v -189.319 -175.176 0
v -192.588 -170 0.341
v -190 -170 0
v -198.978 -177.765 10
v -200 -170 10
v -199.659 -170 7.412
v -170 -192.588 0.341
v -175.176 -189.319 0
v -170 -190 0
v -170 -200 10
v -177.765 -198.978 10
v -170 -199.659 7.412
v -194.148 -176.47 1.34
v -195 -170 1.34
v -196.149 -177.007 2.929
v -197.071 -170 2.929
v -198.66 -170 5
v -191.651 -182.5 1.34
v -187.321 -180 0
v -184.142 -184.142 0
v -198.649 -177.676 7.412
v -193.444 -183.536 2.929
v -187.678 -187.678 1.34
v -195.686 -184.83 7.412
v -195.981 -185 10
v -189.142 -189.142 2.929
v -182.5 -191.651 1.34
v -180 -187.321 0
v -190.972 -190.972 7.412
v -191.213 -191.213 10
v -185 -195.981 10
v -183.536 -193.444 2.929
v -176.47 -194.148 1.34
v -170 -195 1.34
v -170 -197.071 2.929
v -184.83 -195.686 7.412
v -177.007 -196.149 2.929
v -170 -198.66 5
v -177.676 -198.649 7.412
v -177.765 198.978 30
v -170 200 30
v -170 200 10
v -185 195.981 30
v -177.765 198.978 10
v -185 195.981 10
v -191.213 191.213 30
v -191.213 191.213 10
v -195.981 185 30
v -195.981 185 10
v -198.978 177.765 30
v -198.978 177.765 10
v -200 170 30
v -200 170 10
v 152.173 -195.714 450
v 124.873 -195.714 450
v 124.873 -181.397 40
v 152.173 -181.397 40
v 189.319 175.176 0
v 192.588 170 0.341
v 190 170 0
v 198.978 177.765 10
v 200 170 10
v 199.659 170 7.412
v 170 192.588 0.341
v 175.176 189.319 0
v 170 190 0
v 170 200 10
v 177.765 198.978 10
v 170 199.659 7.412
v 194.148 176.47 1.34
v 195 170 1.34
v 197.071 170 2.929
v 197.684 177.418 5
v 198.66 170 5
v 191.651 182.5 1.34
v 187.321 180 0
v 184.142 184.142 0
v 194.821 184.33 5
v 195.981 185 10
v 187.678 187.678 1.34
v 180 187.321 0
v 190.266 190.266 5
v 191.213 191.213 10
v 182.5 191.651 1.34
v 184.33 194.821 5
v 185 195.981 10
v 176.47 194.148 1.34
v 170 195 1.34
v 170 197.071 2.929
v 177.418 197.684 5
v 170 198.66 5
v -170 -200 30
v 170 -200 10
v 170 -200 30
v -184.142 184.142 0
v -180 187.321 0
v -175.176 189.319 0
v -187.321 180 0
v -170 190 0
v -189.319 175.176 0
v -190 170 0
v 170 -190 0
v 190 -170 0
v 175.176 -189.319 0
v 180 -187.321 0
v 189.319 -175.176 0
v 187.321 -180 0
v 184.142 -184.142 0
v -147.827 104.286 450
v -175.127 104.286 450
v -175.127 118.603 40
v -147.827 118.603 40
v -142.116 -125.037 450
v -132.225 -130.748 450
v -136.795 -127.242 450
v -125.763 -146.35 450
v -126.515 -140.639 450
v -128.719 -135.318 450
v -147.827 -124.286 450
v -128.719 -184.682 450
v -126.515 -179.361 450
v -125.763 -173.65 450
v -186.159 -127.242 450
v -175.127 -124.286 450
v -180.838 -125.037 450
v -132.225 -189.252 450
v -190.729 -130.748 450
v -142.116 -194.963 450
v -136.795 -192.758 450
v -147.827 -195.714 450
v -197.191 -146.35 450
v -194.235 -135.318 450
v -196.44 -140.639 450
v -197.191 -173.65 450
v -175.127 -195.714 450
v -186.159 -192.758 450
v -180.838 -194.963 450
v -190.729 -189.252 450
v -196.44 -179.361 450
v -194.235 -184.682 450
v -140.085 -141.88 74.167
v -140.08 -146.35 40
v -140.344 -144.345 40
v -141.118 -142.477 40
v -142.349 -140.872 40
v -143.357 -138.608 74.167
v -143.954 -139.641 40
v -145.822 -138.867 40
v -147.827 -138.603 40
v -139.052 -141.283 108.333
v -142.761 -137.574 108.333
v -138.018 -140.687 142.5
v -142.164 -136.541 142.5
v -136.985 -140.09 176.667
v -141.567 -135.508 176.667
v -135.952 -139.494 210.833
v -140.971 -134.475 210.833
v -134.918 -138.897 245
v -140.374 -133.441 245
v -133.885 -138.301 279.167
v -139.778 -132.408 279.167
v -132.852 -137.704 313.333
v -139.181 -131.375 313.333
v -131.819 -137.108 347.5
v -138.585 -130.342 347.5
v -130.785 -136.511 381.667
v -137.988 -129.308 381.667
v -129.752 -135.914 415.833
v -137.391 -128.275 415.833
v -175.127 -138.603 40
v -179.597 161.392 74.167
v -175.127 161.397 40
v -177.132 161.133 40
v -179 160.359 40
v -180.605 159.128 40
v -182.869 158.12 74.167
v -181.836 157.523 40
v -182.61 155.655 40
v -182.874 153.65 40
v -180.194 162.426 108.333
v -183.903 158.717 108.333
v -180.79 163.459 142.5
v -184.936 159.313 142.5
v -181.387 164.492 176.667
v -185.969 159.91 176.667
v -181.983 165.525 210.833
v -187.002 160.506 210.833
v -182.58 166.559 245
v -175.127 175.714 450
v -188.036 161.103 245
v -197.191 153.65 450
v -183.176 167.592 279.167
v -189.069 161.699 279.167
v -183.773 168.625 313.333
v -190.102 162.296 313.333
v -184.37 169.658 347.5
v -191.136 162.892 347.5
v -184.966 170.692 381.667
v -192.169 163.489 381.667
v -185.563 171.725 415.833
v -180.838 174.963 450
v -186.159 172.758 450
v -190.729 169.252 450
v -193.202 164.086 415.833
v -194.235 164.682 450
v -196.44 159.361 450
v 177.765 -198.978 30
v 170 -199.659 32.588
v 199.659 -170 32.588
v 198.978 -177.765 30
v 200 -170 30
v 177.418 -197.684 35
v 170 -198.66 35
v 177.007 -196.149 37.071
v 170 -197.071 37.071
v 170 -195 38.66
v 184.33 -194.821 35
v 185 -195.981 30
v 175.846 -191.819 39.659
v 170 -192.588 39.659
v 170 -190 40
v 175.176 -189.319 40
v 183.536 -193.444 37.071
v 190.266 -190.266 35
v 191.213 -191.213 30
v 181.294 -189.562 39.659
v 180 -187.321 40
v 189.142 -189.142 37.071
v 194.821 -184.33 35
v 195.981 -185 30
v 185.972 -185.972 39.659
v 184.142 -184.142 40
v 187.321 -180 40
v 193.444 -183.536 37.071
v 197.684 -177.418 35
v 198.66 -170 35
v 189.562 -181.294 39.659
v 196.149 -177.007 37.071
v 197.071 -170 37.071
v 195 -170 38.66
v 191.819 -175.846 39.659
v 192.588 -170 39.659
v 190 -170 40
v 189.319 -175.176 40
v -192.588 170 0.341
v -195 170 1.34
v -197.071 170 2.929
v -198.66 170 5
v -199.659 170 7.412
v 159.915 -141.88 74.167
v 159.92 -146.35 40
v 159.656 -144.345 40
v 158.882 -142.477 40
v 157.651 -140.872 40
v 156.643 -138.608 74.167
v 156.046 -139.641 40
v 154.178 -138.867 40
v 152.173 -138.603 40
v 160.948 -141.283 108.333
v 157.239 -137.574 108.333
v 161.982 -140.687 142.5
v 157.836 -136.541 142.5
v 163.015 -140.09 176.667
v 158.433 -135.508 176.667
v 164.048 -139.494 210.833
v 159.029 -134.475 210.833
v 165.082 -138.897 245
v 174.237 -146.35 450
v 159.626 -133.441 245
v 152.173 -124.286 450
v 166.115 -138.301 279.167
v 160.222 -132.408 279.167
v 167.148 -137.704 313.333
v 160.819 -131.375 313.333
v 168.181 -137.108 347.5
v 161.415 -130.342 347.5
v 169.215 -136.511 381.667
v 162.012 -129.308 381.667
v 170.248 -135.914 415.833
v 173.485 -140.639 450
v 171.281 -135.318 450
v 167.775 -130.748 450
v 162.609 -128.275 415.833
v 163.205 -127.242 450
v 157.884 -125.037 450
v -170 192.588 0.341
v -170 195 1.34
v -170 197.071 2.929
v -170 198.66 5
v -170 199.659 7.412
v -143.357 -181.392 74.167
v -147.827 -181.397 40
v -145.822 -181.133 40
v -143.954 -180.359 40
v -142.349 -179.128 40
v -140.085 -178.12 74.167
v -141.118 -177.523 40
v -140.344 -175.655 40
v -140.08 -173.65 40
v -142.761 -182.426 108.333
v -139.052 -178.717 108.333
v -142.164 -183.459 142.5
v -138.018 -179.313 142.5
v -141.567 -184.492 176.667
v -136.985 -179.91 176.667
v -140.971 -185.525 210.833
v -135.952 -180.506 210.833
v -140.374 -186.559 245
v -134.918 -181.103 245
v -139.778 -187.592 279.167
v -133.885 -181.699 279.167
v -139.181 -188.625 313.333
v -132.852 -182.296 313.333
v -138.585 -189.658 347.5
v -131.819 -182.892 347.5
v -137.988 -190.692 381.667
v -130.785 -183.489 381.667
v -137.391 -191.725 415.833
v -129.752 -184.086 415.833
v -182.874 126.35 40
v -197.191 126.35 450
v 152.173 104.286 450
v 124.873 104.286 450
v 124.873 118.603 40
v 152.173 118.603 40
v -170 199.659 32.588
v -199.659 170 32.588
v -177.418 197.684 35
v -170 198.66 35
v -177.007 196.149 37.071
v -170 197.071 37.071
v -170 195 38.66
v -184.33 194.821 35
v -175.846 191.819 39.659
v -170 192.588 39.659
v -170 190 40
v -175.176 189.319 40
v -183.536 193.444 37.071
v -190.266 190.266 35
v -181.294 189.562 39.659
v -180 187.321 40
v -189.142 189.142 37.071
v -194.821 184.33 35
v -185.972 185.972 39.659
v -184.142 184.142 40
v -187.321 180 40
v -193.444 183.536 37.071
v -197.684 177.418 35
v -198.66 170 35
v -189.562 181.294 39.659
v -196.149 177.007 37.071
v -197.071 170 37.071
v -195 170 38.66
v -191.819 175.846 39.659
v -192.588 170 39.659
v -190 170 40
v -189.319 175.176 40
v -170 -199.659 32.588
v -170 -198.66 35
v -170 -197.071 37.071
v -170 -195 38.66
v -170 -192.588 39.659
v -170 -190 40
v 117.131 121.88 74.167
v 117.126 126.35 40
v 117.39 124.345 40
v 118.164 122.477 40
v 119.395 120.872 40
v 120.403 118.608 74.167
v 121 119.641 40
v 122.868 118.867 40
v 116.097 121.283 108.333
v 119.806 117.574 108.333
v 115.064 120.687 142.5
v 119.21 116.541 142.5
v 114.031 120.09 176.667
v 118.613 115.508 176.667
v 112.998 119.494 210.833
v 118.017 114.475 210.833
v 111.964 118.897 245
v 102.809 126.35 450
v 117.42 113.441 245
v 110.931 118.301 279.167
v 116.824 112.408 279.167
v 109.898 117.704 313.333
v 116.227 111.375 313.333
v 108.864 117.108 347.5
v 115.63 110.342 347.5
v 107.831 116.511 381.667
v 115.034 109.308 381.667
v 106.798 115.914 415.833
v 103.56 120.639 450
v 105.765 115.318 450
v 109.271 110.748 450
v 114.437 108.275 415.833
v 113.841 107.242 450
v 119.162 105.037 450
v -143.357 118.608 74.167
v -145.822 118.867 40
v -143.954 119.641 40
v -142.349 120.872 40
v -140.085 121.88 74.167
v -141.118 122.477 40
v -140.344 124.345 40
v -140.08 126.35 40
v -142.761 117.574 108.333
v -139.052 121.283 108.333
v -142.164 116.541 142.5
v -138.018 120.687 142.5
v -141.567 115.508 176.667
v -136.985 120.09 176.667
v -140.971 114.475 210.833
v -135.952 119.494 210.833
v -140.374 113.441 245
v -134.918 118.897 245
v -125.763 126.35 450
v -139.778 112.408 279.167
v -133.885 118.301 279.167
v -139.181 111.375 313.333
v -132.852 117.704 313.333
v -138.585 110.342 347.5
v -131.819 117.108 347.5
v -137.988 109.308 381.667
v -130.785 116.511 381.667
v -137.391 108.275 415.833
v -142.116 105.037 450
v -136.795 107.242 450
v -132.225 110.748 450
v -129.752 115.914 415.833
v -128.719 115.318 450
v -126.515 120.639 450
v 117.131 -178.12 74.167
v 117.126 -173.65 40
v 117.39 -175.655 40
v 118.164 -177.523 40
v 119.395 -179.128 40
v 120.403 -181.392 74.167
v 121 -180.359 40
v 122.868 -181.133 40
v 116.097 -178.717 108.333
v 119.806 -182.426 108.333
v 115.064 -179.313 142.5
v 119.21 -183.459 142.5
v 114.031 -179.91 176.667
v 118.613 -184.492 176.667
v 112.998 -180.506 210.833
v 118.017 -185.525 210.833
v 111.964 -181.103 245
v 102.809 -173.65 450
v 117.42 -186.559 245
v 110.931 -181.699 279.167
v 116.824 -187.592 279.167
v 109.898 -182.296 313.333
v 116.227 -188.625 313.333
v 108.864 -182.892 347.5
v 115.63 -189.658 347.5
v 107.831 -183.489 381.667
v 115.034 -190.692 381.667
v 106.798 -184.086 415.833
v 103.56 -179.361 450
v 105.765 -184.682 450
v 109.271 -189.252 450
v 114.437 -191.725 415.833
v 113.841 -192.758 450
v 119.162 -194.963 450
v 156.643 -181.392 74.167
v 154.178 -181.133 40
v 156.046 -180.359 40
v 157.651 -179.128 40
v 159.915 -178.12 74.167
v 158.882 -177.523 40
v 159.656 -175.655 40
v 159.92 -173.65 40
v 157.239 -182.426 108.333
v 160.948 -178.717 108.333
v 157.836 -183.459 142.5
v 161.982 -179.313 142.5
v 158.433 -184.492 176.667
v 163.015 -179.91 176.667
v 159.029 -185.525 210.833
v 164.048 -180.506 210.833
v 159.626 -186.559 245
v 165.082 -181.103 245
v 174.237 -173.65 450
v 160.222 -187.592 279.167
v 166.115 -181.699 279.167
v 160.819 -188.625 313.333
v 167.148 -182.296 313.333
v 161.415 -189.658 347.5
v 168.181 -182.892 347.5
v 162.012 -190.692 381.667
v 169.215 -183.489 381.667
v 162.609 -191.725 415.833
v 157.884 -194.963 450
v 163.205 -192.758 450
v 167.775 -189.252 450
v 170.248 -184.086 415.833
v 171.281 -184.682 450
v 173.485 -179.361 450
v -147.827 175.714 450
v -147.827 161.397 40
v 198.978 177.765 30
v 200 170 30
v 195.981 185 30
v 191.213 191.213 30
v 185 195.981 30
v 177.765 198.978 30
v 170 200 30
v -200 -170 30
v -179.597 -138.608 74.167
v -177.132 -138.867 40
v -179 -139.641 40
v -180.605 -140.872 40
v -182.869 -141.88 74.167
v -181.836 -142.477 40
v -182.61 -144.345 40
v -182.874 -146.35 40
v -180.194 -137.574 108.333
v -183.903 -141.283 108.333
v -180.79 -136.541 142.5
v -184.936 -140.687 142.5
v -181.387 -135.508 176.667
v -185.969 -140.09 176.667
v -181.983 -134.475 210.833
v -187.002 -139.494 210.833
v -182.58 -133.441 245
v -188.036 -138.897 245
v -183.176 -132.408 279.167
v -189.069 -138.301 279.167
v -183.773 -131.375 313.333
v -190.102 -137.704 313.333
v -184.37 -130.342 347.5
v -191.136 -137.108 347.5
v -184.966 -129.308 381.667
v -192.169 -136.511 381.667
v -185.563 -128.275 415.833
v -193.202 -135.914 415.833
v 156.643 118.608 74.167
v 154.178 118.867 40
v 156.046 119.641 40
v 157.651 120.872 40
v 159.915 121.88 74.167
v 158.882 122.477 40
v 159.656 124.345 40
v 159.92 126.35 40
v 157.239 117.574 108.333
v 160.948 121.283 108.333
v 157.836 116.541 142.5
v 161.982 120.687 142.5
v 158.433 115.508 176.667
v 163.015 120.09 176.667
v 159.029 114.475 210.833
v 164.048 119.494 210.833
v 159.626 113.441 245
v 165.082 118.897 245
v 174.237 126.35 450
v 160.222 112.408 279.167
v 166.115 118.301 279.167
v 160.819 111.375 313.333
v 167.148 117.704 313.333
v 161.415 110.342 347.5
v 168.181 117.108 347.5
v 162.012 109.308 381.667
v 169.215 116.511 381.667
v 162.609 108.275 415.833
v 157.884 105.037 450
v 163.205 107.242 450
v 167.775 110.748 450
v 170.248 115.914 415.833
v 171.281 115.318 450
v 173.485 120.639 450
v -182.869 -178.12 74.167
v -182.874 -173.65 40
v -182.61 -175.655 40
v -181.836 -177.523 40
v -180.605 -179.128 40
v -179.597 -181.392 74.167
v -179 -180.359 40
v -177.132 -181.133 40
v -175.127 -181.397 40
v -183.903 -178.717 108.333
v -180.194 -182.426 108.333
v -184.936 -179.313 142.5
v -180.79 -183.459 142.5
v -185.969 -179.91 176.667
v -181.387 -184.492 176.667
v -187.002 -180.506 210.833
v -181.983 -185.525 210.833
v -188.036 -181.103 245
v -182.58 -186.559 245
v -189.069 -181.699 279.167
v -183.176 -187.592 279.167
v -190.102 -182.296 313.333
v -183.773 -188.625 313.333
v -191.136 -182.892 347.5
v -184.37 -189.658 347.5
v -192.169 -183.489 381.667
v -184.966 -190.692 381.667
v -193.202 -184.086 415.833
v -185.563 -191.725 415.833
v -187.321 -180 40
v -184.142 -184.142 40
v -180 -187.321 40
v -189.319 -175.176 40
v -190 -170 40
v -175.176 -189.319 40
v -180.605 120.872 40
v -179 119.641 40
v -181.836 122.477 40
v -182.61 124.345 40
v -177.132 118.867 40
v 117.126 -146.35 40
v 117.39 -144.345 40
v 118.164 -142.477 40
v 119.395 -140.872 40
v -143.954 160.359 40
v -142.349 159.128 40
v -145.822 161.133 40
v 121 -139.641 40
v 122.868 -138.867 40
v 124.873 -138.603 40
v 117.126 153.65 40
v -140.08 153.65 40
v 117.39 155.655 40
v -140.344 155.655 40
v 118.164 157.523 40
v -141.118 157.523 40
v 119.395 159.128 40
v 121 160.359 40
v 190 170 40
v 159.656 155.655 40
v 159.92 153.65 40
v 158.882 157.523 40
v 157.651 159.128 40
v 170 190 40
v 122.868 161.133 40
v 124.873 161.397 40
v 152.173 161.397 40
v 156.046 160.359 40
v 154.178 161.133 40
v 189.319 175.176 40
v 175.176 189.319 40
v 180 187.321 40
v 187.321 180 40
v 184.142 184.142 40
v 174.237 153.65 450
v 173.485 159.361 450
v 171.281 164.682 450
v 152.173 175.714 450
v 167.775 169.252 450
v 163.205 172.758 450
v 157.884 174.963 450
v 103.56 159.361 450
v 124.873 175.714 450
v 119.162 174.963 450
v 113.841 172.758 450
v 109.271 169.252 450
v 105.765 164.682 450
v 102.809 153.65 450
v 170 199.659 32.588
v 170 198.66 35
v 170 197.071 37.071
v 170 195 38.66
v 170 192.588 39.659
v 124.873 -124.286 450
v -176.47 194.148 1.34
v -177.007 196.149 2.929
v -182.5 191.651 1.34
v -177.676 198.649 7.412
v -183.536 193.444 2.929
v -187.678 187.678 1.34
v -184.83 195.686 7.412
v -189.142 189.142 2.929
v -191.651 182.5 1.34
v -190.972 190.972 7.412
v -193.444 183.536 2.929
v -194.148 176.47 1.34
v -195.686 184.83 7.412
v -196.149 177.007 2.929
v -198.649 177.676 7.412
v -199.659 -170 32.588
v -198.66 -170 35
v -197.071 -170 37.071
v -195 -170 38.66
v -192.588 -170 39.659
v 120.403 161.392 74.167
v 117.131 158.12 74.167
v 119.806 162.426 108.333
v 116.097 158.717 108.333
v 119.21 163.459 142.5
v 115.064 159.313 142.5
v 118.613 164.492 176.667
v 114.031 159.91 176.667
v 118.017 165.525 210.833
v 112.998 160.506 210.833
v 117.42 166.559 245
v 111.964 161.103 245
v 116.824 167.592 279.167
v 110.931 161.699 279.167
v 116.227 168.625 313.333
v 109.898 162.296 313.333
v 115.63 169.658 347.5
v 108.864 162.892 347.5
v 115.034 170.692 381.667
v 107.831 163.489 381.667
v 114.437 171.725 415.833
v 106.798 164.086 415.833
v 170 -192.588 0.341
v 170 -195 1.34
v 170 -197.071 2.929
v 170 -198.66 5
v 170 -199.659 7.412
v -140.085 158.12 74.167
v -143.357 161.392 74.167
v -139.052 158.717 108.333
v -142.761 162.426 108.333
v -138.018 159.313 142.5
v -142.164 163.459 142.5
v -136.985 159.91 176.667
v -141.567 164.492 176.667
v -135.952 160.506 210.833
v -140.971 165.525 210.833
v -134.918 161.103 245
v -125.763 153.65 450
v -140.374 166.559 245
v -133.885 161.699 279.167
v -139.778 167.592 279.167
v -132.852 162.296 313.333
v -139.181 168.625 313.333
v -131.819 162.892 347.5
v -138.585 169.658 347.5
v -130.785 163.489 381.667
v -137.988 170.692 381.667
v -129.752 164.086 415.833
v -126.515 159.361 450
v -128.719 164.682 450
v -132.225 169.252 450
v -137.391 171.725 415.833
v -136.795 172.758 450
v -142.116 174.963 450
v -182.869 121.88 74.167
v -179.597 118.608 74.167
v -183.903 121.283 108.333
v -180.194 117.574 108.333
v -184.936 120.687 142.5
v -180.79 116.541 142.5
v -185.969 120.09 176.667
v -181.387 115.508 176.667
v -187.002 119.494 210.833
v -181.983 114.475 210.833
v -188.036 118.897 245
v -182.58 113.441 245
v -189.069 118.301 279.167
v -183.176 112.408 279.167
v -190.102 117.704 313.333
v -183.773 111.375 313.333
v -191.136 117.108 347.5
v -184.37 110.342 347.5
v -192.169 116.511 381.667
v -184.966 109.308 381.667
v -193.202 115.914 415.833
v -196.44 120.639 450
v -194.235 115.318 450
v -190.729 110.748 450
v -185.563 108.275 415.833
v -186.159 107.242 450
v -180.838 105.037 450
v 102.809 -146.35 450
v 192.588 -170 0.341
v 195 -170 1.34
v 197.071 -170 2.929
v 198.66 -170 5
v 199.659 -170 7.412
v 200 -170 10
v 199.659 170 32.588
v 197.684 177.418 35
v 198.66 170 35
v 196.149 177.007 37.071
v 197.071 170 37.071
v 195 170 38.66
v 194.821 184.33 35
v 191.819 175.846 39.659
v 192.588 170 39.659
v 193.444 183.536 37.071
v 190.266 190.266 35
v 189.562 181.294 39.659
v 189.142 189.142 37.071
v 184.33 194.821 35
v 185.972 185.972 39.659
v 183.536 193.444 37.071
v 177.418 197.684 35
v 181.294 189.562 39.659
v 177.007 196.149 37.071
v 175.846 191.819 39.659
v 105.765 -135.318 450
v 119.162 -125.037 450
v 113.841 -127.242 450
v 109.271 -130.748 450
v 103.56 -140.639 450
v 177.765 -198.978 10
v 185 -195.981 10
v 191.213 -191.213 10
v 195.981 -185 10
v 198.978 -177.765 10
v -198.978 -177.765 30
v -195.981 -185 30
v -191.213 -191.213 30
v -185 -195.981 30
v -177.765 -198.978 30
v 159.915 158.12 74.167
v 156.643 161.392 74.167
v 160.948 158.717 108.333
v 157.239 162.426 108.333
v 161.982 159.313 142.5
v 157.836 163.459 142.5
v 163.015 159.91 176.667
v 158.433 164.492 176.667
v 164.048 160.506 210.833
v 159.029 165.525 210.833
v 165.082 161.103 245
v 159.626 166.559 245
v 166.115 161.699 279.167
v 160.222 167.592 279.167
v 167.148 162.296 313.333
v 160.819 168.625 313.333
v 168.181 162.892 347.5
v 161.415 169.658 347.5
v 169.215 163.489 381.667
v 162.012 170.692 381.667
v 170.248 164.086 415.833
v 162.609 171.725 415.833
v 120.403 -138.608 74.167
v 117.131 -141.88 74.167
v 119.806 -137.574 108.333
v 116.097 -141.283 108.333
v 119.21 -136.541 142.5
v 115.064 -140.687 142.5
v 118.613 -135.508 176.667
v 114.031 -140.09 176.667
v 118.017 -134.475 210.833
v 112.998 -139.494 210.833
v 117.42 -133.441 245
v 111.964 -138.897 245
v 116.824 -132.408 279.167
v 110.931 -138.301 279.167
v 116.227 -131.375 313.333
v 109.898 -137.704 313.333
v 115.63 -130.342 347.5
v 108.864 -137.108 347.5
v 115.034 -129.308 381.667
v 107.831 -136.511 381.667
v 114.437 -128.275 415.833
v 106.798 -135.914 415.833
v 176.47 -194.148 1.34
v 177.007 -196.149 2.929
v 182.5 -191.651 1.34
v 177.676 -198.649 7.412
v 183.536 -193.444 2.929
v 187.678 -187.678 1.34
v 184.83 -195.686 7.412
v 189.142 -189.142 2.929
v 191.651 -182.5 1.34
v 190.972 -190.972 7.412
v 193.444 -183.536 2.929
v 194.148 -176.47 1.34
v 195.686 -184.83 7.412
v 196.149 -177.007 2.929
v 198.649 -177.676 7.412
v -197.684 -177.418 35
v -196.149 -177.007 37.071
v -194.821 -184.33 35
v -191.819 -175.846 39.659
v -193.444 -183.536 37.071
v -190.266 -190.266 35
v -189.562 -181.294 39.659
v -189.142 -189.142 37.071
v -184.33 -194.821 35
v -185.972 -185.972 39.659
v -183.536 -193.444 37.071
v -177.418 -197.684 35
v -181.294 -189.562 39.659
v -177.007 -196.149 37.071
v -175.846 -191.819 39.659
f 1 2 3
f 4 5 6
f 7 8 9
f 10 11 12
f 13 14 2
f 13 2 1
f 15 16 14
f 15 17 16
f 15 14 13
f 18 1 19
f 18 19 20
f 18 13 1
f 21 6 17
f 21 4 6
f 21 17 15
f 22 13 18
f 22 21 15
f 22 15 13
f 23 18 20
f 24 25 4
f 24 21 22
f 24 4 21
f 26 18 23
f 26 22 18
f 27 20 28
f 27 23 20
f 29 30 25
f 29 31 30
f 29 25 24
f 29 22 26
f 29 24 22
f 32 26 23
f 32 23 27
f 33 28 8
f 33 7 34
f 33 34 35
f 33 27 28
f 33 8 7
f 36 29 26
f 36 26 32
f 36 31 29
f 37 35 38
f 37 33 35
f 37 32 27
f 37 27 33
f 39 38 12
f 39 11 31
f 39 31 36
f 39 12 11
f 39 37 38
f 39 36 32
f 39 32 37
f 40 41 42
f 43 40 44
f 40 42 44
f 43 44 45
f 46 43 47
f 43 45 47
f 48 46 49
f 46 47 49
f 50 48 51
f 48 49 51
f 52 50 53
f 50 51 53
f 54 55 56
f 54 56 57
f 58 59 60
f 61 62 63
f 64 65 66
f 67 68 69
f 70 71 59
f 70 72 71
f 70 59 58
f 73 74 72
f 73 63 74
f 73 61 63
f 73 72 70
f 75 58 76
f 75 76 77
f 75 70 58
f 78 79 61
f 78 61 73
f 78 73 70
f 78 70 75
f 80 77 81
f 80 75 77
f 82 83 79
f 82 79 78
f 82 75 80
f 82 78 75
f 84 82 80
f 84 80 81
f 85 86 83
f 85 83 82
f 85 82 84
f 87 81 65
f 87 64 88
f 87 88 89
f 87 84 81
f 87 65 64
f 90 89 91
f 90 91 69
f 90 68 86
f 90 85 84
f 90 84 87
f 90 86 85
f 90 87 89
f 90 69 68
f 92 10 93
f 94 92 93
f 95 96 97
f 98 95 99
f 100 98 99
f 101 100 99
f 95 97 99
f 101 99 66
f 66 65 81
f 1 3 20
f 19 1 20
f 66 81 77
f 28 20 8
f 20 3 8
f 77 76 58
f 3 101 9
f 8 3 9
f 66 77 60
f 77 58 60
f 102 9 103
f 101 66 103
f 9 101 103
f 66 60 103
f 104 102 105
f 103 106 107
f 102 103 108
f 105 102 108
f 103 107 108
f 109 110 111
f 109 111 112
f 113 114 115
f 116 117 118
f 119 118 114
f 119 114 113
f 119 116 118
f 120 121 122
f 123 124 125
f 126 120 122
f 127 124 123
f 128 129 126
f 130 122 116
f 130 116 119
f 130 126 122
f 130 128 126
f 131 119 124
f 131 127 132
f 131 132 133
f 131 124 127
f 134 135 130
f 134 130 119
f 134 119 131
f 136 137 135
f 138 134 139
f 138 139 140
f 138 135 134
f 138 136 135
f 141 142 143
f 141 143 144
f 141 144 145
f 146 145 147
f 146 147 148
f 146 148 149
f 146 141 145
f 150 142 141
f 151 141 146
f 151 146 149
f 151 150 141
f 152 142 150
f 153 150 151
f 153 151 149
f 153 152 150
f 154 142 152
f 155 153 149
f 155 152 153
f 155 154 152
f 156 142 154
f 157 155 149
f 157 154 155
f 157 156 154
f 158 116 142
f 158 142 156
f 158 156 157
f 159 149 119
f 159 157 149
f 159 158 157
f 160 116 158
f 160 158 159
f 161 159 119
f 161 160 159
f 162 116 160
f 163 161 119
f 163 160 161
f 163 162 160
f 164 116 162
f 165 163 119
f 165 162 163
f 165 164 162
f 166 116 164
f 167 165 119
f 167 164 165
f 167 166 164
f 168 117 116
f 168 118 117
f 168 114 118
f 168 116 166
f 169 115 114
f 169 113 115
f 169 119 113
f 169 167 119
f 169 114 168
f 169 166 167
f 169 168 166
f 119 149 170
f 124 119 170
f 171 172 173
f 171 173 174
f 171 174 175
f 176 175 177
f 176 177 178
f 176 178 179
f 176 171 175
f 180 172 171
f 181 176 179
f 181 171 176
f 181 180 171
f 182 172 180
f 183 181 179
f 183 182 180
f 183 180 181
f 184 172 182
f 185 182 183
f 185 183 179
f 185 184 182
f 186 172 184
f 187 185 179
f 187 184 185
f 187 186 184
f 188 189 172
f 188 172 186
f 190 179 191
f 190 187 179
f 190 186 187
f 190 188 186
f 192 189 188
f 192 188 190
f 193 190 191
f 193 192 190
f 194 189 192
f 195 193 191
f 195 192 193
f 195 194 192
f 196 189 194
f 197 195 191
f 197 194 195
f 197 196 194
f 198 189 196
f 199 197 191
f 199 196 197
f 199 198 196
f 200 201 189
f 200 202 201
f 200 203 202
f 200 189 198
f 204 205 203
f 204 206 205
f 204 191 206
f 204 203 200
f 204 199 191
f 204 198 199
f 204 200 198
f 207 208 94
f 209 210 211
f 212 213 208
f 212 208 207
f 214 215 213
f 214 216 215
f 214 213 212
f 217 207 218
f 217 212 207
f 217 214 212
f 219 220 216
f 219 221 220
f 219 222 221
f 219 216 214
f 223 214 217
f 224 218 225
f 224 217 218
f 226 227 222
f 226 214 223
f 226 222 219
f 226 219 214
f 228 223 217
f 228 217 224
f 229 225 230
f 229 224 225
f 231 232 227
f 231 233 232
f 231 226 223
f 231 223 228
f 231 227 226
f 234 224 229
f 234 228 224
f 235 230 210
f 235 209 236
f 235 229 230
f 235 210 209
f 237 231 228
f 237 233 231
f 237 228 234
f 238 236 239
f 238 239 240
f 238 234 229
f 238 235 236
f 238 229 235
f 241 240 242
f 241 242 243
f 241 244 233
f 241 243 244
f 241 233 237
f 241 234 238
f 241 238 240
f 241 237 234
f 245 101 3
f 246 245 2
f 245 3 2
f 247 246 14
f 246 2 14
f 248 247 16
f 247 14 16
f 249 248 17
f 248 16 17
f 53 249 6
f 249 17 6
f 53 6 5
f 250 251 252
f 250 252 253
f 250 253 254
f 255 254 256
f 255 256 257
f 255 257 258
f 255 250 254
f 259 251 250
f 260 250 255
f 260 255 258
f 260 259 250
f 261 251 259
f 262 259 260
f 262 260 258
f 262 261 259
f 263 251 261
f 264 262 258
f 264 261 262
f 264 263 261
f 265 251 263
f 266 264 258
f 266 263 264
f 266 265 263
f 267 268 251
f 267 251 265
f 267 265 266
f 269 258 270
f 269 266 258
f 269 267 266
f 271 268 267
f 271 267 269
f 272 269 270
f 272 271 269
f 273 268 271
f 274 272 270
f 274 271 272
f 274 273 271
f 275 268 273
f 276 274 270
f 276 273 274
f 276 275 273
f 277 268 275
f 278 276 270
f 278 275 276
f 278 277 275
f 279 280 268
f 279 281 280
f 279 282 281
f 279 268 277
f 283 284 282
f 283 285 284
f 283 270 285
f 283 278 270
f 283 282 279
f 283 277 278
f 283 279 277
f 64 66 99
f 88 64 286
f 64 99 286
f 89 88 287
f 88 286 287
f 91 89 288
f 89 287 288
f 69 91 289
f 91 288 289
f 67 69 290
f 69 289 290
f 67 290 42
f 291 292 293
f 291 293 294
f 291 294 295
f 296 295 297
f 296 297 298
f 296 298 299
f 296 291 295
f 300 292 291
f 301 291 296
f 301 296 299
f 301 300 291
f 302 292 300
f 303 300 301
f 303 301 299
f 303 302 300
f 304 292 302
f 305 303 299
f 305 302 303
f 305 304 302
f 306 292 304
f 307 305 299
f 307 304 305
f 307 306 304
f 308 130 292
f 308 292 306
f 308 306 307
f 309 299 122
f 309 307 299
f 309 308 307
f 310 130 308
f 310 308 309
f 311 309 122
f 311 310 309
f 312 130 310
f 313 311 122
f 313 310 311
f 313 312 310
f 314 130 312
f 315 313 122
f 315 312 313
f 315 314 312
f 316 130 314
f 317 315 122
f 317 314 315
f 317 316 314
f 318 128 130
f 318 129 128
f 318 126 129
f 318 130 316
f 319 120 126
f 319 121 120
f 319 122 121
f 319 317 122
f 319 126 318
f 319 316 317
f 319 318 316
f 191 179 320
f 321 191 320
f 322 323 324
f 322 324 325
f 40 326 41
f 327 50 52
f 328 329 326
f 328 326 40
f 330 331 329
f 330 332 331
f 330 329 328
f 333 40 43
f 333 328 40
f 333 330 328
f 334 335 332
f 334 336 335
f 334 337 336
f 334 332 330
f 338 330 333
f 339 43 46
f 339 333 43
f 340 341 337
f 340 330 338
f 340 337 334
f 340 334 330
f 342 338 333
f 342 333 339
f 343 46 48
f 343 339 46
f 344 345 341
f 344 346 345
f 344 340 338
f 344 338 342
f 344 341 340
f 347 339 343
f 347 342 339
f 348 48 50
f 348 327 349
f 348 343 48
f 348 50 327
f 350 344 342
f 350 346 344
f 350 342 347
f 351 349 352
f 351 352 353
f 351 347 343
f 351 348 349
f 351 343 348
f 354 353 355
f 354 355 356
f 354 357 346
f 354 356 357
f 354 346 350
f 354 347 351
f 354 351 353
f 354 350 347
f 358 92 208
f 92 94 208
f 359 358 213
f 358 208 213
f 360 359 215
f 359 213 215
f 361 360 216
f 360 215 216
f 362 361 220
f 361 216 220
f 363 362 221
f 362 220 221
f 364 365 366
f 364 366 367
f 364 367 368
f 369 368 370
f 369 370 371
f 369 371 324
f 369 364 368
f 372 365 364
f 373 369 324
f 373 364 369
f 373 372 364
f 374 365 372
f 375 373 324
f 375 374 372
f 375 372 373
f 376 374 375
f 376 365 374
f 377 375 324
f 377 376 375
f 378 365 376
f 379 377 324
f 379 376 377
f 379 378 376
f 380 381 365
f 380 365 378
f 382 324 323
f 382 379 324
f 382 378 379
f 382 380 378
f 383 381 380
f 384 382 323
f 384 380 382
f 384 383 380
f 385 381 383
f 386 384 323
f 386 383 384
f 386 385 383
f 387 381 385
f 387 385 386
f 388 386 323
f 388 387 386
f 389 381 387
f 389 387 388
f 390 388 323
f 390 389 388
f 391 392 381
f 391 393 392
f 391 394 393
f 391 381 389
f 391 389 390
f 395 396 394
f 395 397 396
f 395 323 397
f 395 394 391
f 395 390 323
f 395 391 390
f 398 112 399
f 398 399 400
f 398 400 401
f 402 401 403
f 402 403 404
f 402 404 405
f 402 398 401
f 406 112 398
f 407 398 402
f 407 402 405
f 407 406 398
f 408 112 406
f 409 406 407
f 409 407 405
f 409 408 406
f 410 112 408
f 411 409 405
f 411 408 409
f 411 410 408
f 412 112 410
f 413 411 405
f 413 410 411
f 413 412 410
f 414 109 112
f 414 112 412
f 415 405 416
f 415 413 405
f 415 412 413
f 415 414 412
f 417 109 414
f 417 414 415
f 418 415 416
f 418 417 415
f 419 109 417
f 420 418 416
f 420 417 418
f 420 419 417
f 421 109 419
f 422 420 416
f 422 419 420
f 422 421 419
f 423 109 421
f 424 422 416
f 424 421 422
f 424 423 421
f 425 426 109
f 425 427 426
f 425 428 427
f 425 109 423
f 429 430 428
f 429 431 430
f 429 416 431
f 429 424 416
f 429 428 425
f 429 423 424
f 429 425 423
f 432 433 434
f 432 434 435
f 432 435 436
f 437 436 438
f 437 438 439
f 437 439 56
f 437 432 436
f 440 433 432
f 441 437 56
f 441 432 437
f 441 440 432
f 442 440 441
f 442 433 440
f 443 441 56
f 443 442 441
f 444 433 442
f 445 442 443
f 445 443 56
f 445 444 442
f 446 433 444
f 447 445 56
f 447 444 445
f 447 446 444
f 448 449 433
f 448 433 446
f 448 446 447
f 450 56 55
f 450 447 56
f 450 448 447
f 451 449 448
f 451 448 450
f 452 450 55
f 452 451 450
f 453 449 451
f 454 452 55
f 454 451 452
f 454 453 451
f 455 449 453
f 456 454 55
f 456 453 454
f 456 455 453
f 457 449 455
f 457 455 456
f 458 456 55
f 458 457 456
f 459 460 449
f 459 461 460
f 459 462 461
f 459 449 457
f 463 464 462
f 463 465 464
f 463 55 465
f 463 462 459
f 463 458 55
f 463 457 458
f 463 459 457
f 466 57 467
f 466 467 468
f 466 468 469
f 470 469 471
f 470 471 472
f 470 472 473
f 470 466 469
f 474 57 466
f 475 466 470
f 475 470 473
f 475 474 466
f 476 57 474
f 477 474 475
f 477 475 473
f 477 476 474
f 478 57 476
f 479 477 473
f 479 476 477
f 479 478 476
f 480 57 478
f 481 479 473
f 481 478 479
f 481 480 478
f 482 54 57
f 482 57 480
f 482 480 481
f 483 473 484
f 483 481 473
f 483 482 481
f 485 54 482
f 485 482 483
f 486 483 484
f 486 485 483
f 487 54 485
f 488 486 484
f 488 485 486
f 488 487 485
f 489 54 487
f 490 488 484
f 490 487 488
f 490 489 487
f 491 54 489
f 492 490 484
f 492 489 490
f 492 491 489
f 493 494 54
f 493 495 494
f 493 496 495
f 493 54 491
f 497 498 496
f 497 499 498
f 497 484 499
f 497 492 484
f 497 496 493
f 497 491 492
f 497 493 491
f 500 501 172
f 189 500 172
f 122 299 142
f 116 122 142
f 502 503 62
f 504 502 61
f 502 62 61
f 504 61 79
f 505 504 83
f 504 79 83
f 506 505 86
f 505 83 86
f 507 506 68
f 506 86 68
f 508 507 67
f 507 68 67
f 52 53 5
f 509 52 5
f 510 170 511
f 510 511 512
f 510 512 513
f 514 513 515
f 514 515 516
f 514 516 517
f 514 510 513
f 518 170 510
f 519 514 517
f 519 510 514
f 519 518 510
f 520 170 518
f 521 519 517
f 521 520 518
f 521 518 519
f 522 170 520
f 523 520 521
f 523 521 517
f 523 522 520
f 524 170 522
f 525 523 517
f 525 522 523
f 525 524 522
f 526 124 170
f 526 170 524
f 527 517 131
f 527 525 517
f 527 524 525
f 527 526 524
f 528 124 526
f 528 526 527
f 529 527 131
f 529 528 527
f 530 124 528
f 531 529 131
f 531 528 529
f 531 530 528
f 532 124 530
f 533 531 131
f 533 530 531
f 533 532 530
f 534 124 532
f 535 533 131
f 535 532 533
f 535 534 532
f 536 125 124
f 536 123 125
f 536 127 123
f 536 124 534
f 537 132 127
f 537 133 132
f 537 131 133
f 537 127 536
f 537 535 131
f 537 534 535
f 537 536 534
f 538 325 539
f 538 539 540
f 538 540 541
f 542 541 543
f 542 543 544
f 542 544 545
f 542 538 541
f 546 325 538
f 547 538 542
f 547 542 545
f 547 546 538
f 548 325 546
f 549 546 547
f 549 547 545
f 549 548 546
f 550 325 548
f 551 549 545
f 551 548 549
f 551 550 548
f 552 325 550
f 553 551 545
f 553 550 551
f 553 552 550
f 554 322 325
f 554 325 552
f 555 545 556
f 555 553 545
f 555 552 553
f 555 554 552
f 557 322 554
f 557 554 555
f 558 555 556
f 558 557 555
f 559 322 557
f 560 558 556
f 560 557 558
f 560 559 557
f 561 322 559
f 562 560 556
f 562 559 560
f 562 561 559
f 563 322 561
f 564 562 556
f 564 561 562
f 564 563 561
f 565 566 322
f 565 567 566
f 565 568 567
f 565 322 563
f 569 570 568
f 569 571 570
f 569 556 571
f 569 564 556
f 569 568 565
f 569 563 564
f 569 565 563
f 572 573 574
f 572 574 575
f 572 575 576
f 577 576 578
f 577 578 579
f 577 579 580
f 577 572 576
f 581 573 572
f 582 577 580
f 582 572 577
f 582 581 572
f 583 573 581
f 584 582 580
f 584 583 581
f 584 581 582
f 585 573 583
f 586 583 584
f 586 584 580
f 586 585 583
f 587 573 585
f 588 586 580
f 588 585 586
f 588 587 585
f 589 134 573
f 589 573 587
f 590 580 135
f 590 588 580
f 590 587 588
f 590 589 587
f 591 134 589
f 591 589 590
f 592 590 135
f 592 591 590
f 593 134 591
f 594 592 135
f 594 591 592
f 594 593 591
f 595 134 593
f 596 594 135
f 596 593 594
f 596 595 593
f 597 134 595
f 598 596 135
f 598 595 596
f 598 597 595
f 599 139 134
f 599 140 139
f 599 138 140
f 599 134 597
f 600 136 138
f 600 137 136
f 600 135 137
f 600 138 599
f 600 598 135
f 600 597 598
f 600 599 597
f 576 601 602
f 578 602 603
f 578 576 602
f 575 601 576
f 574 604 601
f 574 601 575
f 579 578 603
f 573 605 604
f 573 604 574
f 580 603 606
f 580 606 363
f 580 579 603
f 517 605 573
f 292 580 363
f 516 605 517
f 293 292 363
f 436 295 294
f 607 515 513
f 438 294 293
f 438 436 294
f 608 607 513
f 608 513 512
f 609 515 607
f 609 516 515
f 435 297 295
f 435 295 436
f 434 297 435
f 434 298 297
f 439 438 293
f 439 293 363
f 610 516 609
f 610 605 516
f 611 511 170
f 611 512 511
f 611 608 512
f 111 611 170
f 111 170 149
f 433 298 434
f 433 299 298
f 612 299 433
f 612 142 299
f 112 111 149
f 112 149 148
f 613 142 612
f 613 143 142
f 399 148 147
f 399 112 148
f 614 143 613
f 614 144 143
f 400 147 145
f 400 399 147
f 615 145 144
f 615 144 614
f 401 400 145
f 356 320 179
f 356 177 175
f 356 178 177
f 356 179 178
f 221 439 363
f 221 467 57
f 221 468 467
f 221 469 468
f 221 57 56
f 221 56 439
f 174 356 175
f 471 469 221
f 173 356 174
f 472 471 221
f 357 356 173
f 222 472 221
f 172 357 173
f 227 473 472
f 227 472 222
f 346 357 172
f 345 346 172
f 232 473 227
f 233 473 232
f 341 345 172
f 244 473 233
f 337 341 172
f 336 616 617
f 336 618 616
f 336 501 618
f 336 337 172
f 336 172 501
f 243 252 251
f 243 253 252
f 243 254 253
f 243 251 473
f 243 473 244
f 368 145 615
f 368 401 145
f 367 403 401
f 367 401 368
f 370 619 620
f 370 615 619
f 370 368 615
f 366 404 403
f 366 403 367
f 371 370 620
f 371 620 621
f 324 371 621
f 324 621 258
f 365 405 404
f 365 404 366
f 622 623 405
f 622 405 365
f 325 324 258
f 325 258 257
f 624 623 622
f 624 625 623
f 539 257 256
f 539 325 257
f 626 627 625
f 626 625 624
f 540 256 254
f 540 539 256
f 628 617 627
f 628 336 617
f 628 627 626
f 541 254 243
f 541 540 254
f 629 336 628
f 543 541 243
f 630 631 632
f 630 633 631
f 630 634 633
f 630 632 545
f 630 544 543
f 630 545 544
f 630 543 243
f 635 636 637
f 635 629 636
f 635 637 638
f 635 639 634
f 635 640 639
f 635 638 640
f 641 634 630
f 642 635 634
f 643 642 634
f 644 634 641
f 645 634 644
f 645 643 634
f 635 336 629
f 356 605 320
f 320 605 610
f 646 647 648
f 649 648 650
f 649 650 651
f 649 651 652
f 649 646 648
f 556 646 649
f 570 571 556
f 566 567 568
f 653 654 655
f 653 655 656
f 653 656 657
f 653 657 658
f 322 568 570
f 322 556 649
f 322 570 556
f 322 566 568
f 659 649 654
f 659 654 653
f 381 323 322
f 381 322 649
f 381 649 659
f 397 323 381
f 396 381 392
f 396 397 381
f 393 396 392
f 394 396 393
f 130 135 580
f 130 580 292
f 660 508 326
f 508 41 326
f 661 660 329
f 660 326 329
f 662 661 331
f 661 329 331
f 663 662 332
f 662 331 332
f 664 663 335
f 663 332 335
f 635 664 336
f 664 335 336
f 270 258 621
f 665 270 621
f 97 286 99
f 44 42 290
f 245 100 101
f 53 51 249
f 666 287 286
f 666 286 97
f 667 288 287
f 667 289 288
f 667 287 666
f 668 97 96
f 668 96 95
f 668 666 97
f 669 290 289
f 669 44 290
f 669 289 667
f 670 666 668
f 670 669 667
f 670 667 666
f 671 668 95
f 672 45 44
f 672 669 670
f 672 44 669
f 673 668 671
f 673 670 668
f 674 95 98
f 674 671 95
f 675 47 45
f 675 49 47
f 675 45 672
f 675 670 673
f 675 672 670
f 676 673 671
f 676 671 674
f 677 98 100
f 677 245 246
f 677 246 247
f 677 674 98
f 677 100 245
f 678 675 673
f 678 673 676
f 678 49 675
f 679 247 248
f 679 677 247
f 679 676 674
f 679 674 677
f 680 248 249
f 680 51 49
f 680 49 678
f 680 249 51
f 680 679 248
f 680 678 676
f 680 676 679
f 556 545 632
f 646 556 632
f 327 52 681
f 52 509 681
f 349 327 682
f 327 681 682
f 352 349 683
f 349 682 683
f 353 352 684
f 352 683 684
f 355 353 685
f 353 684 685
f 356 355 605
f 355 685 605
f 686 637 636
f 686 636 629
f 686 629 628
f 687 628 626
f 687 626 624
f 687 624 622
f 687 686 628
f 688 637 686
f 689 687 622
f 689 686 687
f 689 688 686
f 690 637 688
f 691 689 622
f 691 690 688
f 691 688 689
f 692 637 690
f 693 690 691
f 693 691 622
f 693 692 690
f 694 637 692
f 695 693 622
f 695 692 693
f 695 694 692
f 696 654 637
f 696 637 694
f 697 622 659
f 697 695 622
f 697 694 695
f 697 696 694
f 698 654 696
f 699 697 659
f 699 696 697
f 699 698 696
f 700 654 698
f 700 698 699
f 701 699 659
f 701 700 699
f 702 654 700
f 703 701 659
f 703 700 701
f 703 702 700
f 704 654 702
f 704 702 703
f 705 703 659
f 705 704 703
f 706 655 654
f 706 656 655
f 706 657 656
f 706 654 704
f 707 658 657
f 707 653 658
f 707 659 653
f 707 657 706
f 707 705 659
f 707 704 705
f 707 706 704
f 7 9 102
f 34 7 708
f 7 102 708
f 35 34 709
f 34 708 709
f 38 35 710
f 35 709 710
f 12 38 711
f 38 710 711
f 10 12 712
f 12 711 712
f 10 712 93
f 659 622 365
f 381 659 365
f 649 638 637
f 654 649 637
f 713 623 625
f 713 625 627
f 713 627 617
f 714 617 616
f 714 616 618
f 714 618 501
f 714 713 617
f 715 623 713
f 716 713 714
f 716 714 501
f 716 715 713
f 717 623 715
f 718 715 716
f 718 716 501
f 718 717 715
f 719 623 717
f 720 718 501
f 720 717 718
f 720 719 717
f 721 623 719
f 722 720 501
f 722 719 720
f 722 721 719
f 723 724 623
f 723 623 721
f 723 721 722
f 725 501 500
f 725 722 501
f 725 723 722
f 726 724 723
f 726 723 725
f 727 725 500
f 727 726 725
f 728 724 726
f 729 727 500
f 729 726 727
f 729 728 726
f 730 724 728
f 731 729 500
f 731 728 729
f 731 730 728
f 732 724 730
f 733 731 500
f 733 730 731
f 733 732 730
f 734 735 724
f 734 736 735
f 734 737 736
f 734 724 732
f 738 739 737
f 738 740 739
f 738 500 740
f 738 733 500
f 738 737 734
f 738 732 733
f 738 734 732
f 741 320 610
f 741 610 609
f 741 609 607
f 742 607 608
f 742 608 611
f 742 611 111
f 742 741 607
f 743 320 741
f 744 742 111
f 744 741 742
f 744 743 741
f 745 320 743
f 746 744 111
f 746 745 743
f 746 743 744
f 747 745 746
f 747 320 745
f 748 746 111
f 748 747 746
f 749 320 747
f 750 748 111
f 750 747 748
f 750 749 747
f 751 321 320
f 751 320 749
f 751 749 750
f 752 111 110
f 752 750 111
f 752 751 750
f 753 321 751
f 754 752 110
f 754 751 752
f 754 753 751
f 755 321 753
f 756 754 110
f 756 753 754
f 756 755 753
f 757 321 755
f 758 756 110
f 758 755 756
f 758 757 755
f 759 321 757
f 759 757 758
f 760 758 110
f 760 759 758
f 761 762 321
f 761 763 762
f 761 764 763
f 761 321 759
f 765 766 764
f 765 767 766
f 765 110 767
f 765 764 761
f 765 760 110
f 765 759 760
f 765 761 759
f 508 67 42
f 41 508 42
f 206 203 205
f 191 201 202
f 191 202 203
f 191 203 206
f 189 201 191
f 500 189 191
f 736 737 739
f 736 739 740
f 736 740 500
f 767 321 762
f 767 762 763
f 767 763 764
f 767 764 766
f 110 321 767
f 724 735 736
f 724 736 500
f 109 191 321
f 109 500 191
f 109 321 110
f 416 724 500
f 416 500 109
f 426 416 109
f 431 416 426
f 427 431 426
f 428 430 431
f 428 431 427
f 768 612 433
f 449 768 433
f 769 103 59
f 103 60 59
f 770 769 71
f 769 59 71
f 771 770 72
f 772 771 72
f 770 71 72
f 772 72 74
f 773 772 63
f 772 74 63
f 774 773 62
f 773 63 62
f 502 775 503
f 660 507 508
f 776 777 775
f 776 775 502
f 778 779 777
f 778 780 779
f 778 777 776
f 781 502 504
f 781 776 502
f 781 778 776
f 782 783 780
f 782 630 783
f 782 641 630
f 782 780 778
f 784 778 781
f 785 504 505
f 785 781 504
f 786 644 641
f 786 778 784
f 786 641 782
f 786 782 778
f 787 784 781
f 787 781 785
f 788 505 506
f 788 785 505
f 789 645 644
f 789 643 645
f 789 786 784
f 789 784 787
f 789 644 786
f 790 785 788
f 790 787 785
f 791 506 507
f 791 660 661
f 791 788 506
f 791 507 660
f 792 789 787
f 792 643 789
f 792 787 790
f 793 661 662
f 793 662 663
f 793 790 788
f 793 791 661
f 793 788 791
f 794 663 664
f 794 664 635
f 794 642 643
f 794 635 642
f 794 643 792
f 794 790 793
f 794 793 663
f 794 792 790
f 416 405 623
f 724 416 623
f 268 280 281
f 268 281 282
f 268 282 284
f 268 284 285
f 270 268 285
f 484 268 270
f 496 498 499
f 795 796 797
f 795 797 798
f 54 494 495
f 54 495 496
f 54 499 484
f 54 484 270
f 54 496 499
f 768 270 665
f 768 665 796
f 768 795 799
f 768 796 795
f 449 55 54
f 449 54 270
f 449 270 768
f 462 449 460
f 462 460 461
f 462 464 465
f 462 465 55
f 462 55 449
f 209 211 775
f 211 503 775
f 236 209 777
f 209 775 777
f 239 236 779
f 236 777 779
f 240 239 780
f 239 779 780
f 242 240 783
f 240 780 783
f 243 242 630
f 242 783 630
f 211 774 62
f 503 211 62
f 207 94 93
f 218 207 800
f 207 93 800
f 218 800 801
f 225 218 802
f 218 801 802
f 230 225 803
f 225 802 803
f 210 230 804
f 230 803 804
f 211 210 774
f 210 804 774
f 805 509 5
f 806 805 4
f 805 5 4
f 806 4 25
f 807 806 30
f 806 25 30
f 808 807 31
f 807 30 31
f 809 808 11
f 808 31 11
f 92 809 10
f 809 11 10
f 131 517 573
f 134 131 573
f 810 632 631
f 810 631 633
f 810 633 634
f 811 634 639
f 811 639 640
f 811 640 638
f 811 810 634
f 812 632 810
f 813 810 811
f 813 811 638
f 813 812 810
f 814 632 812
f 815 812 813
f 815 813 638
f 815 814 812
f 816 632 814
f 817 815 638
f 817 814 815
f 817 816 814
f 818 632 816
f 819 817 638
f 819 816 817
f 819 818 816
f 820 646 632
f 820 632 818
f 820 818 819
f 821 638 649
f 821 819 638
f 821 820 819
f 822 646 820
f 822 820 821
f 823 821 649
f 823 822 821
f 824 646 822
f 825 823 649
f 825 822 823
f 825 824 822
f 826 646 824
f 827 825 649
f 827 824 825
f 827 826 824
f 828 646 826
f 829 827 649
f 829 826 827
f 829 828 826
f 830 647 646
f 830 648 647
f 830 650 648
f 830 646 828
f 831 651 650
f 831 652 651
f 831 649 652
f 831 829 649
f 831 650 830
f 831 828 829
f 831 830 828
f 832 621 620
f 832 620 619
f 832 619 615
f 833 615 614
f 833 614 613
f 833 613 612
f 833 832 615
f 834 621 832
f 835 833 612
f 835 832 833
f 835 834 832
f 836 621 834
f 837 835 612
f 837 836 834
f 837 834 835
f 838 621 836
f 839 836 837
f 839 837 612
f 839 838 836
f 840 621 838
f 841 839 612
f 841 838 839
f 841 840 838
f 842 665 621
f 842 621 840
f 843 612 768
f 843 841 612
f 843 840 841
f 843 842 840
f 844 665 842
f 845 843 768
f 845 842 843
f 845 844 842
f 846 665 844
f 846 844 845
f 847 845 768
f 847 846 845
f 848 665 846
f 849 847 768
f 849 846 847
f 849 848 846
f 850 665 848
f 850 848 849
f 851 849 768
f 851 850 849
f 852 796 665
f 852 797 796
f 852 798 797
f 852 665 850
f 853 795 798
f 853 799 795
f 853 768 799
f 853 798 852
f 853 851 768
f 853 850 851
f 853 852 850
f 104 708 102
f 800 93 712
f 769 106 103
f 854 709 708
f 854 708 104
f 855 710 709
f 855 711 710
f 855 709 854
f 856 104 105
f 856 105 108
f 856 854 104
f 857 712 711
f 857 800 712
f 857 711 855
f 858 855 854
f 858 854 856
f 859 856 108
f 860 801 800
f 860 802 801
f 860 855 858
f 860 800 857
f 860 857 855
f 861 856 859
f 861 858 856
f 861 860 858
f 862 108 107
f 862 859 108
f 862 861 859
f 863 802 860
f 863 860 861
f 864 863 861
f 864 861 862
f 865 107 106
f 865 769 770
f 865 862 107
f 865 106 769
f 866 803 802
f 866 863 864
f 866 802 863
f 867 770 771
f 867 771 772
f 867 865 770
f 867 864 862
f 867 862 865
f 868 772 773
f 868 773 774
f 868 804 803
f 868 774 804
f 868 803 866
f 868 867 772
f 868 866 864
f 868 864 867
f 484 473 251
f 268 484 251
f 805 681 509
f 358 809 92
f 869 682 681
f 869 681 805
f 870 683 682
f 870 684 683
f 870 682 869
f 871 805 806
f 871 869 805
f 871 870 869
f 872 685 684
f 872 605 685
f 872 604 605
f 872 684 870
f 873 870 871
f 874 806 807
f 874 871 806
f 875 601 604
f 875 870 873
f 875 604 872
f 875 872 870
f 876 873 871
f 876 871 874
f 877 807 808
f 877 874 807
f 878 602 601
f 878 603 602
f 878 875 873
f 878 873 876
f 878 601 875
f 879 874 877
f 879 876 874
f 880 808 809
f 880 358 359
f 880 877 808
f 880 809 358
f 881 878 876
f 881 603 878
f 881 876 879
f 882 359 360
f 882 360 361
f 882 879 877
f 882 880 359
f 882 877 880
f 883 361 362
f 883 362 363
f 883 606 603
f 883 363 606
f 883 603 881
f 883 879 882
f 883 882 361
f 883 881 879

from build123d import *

# Parameters (mm, degrees)
F2_DEPTH = 40
F3_DEPTH = 450
F3_TAPER = -2
F4_R     = 10


with BuildPart() as f2:
    # F0 (on Top) → F2 (new body)
    with BuildSketch(Plane.XY):
        with BuildLine():
            ThreePointArc((200, 170), (191.2132034356, 191.2132034356), (170, 200))
            Line((170, 200), (-170, 200))
            ThreePointArc((-170, 200), (-191.2132034356, 191.2132034356), (-200, 170))
            Line((-200, 170), (-200, -170))
            ThreePointArc((-200, -170), (-191.2132034356, -191.2132034356), (-170, -200))
            Line((-170, -200), (170, -200))
            ThreePointArc((170, -200), (191.2132034356, -191.2132034356), (200, -170))
            Line((200, -170), (200, 170))
        make_face()
    extrude(amount=F2_DEPTH)

    # F1 (on face) → F3 (join)
    with BuildSketch(Plane.XY):
        with BuildLine():
            Line((-175.1270698547, 120), (-147.8270698547, 120))
            ThreePointArc((-147.8270698547, 120), (-143.3369417942, 121.8598719395), (-141.4770698547, 126.35))
            Line((-141.4770698547, 126.35), (-141.4770698547, 153.65))
            ThreePointArc((-141.4770698547, 153.65), (-143.3369417942, 158.1401280605), (-147.8270698547, 160))
            Line((-147.8270698547, 160), (-175.1270698547, 160))
            ThreePointArc((-175.1270698547, 160), (-179.6171979153, 158.1401280605), (-181.4770698547, 153.65))
            Line((-181.4770698547, 153.65), (-181.4770698547, 126.35))
            ThreePointArc((-181.4770698547, 126.35), (-179.6171979153, 121.8598719395), (-175.1270698547, 120))
        make_face()
        with BuildLine():
            Line((-181.4770698547, -146.35), (-181.4770698547, -173.65))
            ThreePointArc((-181.4770698547, -173.65), (-179.6171979153, -178.1401280605), (-175.1270698547, -180))
            Line((-175.1270698547, -180), (-147.8270698547, -180))
            ThreePointArc((-147.8270698547, -180), (-143.3369417942, -178.1401280605), (-141.4770698547, -173.65))
            Line((-141.4770698547, -173.65), (-141.4770698547, -146.35))
            ThreePointArc((-141.4770698547, -146.35), (-143.3369417942, -141.8598719395), (-147.8270698547, -140))
            Line((-147.8270698547, -140), (-175.1270698547, -140))
            ThreePointArc((-175.1270698547, -140), (-179.6171979153, -141.8598719395), (-181.4770698547, -146.35))
        make_face()
        with BuildLine():
            Line((118.5229301453, 153.65), (118.5229301453, 126.35))
            ThreePointArc((118.5229301453, 126.35), (120.3828020847, 121.8598719395), (124.8729301453, 120))
            Line((124.8729301453, 120), (152.1729301453, 120))
            ThreePointArc((152.1729301453, 120), (156.6630582058, 121.8598719395), (158.5229301453, 126.35))
            Line((158.5229301453, 126.35), (158.5229301453, 153.65))
            ThreePointArc((158.5229301453, 153.65), (156.6630582058, 158.1401280605), (152.1729301453, 160))
            Line((152.1729301453, 160), (124.8729301453, 160))
            ThreePointArc((124.8729301453, 160), (120.3828020847, 158.1401280605), (118.5229301453, 153.65))
        make_face()
        with BuildLine():
            Line((118.5229301453, -146.35), (118.5229301453, -173.65))
            ThreePointArc((118.5229301453, -173.65), (120.3828020847, -178.1401280605), (124.8729301453, -180))
            Line((124.8729301453, -180), (152.1729301453, -180))
            ThreePointArc((152.1729301453, -180), (156.6630582058, -178.1401280605), (158.5229301453, -173.65))
            Line((158.5229301453, -173.65), (158.5229301453, -146.35))
            ThreePointArc((158.5229301453, -146.35), (156.6630582058, -141.8598719395), (152.1729301453, -140))
            Line((152.1729301453, -140), (124.8729301453, -140))
            ThreePointArc((124.8729301453, -140), (120.3828020847, -141.8598719395), (118.5229301453, -146.35))
        make_face()
    extrude(amount=F3_DEPTH, taper=F3_TAPER)

    # F4
    f4_edges = [f2.edges().sort_by_distance(p)[0] for p in [
        (200, 170, 20),
        (170, 200, 20),
        (191.213203, 191.213203, 0),
        (191.213203, 191.213203, 40),
    ]]
    fillet(f4_edges, radius=F4_R)


solid = f2.part
